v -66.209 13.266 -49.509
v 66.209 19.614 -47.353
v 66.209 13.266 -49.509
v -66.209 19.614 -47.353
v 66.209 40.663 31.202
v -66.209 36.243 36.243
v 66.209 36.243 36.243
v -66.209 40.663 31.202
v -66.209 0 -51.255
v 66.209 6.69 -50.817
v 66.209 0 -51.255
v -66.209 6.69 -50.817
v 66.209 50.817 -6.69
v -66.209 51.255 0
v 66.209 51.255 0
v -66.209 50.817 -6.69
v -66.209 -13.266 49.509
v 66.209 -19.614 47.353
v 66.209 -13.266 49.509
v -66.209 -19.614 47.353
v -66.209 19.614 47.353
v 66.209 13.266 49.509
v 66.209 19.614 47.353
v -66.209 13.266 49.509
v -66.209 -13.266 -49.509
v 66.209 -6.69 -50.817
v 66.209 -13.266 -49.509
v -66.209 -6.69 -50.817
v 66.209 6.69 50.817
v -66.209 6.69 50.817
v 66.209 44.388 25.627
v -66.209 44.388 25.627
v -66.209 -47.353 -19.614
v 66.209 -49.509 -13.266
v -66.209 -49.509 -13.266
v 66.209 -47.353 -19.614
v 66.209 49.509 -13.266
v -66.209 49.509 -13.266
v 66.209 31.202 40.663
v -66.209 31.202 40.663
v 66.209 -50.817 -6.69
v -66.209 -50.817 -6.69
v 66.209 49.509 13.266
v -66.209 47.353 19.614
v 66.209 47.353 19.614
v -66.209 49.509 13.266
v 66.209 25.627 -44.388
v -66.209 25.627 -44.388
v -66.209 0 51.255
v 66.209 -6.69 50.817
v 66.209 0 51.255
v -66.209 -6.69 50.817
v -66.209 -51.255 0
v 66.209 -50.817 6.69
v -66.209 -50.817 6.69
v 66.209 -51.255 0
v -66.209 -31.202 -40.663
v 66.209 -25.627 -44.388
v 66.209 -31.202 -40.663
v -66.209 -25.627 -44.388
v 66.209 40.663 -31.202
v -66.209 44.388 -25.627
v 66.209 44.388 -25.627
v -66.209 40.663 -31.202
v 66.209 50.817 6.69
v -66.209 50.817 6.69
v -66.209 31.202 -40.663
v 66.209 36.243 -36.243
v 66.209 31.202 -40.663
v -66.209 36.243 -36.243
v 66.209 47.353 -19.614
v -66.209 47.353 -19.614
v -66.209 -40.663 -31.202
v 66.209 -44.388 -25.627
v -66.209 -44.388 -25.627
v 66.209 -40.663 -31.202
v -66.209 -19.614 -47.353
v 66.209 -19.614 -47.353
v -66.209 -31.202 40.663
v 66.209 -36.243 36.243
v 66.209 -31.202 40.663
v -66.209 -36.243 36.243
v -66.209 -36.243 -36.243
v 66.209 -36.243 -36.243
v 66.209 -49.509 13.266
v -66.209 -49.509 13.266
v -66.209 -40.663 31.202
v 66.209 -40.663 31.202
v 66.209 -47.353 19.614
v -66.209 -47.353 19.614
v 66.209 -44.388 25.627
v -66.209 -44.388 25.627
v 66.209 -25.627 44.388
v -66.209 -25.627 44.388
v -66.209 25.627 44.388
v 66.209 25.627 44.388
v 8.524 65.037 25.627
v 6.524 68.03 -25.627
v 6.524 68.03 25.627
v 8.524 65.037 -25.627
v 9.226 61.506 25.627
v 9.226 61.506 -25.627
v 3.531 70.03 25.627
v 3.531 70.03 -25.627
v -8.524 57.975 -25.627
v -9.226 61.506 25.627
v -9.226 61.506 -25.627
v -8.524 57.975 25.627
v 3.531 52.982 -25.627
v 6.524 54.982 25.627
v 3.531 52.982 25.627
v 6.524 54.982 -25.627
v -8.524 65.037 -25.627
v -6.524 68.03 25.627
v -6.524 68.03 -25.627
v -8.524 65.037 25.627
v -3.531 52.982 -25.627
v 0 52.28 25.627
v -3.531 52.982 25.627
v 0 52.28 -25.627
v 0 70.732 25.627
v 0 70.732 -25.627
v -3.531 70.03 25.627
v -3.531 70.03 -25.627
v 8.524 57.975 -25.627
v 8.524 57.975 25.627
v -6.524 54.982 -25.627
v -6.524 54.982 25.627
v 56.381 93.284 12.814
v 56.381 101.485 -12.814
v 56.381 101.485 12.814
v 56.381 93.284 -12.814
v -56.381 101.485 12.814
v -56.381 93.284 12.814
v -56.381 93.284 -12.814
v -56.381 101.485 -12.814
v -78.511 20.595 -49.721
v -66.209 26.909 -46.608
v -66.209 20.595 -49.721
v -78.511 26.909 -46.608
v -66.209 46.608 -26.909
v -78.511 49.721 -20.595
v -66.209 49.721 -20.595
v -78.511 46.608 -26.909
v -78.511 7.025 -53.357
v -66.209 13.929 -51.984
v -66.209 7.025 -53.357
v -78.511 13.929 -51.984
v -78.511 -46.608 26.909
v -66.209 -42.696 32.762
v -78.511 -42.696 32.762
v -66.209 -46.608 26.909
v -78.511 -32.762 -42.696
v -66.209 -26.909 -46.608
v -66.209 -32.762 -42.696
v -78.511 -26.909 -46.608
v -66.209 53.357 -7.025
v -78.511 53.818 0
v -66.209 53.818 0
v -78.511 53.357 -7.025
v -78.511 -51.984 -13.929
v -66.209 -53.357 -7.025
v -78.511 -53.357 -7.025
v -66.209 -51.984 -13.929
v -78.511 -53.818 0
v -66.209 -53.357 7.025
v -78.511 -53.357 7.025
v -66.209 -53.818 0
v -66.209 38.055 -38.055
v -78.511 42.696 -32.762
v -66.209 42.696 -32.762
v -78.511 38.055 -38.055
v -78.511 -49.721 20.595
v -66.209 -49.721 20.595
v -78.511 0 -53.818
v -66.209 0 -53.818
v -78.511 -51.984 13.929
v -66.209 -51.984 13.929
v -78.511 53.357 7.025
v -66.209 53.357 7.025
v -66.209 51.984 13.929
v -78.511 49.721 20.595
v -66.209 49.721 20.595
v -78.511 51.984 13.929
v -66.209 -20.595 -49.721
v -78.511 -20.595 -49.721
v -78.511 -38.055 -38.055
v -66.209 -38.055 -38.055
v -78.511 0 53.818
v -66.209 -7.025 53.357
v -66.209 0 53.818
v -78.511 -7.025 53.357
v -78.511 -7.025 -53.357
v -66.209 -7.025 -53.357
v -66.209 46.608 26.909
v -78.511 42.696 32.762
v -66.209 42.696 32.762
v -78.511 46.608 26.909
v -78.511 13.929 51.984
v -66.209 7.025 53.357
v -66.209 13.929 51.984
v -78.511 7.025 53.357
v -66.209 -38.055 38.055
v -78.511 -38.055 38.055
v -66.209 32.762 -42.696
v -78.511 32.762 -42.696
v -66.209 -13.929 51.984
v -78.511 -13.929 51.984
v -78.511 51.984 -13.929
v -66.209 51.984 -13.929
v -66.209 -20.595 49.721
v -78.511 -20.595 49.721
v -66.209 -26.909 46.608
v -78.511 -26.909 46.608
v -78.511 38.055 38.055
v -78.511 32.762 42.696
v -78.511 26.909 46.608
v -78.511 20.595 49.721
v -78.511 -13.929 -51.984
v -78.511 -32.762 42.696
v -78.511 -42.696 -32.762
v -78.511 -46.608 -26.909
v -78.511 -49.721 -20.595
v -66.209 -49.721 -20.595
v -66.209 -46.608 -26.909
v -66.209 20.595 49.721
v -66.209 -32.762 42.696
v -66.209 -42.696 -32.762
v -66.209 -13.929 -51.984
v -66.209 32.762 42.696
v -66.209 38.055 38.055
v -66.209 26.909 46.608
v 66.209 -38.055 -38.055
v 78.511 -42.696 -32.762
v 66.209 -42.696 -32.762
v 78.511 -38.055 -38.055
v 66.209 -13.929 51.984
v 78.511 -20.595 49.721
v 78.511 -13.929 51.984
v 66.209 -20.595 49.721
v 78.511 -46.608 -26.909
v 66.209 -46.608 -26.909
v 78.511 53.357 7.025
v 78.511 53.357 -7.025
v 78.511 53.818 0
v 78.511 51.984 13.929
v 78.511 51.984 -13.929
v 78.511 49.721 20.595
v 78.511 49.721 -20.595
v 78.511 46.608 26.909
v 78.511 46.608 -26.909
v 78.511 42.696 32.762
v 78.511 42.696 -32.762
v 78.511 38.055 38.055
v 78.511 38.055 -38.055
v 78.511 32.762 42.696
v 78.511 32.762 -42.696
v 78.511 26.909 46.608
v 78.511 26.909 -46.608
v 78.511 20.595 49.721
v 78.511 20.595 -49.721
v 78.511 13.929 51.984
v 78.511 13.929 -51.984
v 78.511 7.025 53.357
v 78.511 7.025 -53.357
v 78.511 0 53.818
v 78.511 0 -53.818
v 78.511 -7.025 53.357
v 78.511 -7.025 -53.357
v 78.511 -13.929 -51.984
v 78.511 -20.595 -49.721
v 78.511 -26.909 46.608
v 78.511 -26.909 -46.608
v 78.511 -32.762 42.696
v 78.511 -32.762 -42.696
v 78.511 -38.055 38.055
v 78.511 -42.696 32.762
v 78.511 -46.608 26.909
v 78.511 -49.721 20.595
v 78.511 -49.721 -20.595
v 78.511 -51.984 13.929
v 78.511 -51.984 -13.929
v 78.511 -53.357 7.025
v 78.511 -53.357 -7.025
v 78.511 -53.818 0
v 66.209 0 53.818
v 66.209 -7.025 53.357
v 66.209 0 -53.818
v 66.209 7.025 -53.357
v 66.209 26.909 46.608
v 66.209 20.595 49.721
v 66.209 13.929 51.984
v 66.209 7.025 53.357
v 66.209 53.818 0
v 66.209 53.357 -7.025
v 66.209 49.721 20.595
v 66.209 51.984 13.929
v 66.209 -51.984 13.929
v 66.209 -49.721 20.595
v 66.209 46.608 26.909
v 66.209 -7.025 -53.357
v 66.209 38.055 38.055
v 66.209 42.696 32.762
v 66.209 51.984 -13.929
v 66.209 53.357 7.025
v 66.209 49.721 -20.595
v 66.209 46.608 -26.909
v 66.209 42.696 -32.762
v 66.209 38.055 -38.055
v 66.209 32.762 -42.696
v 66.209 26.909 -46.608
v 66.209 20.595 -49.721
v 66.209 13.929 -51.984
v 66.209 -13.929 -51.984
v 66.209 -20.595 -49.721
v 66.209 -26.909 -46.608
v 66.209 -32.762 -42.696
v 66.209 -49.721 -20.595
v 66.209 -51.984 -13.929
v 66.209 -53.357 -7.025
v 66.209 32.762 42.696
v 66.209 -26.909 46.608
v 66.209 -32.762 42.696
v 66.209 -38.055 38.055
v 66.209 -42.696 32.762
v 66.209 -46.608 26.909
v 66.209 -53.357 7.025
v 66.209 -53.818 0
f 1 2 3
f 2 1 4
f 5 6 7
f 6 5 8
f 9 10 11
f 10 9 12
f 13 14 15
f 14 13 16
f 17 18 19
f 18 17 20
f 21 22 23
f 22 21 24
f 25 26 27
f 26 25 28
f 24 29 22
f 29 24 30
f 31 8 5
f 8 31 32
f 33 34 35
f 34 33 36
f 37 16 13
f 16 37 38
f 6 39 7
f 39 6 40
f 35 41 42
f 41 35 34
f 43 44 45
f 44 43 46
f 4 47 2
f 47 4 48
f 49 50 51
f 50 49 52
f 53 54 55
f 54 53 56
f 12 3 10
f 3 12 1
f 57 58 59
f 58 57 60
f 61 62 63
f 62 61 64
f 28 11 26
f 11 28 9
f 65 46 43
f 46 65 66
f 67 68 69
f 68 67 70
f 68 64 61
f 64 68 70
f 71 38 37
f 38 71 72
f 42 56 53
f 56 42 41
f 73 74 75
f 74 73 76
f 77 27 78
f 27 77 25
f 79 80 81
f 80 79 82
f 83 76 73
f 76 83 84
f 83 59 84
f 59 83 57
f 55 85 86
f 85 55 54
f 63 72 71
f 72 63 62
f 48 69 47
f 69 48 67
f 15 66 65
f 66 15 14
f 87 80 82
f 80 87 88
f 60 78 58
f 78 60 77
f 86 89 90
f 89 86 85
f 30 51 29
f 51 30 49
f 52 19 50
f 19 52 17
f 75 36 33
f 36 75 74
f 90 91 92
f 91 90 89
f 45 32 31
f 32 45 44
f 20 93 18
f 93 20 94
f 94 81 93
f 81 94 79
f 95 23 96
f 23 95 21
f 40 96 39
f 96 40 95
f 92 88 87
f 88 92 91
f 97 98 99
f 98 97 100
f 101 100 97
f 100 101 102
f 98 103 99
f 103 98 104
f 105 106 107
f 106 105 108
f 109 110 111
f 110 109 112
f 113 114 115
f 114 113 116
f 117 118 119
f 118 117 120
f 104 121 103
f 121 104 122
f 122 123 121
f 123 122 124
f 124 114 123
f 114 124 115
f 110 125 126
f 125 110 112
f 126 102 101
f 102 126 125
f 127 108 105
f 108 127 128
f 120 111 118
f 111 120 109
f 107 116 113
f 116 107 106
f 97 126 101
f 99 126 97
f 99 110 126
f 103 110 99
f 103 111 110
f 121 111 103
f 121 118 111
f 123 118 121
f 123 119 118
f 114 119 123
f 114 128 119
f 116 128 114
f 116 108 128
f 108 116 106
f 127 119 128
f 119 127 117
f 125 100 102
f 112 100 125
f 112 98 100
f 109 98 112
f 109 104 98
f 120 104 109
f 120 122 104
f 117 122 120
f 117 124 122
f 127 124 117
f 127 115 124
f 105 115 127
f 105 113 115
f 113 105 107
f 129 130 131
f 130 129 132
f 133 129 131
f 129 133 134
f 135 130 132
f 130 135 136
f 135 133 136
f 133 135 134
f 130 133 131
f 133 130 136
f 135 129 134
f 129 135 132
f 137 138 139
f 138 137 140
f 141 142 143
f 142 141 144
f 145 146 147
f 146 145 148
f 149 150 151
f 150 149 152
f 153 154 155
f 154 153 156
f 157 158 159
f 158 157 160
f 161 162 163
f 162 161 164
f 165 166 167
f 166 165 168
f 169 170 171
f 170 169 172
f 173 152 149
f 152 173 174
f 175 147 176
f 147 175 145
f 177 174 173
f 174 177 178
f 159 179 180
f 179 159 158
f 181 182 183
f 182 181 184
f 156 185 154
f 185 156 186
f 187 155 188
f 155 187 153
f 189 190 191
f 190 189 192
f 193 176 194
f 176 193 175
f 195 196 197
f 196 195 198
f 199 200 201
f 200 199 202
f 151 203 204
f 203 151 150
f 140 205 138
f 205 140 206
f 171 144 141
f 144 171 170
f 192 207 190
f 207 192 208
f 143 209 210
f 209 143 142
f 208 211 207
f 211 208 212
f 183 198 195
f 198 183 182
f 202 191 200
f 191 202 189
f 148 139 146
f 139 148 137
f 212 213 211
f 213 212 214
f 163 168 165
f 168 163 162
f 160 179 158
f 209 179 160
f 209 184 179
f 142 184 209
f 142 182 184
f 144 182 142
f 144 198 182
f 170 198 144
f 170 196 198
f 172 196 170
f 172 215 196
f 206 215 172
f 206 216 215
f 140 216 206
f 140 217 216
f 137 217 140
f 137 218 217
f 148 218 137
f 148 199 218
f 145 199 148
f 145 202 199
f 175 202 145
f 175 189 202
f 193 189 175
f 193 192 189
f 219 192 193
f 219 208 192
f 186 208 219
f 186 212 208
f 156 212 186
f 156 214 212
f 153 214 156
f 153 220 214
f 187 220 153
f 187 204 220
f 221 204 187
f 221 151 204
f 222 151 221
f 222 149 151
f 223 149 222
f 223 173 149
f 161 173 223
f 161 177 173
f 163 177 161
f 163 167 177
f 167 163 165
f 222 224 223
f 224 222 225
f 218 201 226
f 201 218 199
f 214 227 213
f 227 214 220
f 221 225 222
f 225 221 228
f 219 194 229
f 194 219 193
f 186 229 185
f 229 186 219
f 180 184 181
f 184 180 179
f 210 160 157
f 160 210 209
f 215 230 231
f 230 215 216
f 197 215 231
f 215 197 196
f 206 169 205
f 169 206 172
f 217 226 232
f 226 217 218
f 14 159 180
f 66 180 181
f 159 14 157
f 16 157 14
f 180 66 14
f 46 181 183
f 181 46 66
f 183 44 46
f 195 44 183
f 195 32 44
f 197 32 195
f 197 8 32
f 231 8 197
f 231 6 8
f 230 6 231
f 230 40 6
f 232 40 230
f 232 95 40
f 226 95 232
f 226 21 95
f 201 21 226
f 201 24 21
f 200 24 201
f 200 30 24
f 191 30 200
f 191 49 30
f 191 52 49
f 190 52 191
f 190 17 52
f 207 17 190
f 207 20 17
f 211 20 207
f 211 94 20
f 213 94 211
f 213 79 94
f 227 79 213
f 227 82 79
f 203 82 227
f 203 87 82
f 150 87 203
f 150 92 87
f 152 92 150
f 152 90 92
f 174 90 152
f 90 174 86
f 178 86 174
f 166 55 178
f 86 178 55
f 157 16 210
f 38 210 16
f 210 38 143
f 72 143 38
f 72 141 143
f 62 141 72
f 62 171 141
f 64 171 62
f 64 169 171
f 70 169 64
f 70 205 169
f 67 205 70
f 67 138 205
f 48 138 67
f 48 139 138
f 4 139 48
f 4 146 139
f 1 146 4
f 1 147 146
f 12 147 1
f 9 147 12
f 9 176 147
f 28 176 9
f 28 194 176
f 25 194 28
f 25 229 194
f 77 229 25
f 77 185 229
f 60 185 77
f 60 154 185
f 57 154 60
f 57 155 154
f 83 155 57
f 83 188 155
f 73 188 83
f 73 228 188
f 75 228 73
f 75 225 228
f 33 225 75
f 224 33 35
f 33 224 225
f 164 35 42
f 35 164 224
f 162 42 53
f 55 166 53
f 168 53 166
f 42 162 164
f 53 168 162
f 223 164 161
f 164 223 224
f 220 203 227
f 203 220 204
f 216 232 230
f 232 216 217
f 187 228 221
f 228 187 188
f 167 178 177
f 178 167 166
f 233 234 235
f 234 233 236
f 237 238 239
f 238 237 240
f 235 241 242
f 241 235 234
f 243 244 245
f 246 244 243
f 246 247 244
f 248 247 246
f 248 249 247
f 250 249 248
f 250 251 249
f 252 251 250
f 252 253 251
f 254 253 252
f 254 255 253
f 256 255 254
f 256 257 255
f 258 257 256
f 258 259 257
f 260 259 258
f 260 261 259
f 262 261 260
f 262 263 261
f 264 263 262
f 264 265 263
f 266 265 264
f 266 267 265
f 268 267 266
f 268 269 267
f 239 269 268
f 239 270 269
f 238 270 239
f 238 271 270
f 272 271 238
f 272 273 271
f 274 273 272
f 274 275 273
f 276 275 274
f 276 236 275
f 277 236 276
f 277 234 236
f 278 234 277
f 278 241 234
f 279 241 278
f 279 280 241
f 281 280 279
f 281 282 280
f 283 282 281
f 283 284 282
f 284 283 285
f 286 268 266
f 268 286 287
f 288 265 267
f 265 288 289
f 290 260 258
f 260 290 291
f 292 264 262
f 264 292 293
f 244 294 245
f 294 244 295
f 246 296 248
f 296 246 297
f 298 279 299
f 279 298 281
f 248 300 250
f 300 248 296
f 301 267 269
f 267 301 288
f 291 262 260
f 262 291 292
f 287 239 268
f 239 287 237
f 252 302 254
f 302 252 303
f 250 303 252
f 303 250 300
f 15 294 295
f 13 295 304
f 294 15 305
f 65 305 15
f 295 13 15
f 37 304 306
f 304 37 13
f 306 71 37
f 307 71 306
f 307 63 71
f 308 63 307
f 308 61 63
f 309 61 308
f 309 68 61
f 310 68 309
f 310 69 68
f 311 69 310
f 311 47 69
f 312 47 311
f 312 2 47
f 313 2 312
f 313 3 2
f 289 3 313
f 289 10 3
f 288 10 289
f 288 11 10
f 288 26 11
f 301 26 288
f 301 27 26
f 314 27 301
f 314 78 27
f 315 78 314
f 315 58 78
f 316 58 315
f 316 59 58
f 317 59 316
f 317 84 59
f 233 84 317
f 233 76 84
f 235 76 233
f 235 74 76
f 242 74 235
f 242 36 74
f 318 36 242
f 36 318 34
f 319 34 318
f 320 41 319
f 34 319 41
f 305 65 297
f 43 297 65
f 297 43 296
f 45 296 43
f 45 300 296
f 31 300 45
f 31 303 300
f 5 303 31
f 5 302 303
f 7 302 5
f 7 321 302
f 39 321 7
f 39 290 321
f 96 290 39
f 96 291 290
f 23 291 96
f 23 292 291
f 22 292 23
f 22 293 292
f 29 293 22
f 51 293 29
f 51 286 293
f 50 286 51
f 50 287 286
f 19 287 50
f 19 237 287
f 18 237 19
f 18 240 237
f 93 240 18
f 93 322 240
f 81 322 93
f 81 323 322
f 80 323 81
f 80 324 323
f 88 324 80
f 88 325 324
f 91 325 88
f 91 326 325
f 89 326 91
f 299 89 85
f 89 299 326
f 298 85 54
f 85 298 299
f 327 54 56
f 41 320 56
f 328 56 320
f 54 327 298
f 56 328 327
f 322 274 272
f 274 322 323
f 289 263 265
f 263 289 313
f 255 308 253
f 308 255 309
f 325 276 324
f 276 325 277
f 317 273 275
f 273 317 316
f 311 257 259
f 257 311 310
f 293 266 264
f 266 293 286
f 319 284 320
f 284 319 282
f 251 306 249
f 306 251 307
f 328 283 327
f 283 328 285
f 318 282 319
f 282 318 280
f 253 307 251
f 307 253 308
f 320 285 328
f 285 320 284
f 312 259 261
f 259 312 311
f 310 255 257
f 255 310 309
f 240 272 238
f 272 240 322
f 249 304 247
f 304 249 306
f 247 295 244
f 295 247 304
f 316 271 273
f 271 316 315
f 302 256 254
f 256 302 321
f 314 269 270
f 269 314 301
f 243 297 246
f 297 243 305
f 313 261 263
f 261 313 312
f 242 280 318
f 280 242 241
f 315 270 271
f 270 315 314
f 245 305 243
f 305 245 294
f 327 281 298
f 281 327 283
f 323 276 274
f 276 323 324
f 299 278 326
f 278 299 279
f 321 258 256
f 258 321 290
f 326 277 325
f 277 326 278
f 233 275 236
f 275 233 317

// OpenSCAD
// Auto-generated by scripts/author_from_manifest.py (Phase D.3).
// Source: data/phase_d_manifest.json (sku_intent='nibco-f619-osy-gate-2in').
// Do not hand-edit — regenerate from the manifest.
//
// @part nibco_f619_osy_gate_2in
// @kind valve
// @category valve.gate
// @display-name "Nibco F-619 OS&Y Gate Valve 2\" Flanged"
// @mfg nibco
// @mfg-pn F-619
// @listing UL FM
// @price-usd 330.00
// @install-minutes 35
// @crew foreman
// @param size_in number default=2 label="Size" unit="in"
// @port inlet position=[-0.05,0,0] direction=[-1,0,0] style=grooved size_in=2 role=run_a
// @port outlet position=[0.05,0,0] direction=[1,0,0] style=grooved size_in=2 role=run_b

size_in = 2.0;

function od_mm(nps) =
    nps ==   1  ? 33.4 :
    nps == 1.25 ? 42.2 :
    nps == 1.5  ? 48.3 :
    nps ==   2  ? 60.3 :
    nps == 2.5  ? 73.0 :
    nps ==   3  ? 88.9 :
    nps ==   4  ? 114.3 :
    nps ==   6  ? 168.3 :
    nps ==   8  ? 219.1 : 73.0;

od = od_mm(size_in);
body_len = od * 2.4;
body_d   = od * 1.7;

union() {
    // Valve body
    rotate([0, 90, 0])
        cylinder(h = body_len, d = body_d, center = true, $fn = 48);
    // Stem / handle indicator
    translate([0, body_d * 0.6, 0])
        cylinder(h = body_d * 0.5, d = body_d * 0.18, center = true, $fn = 16);
    translate([0, body_d * 0.95, 0])
        cube([body_d * 1.1, body_d * 0.08, body_d * 0.25], center = true);
    // End flanges
    translate([-body_len/2, 0, 0])
        rotate([0, 90, 0])
        cylinder(h = body_d * 0.12, d = body_d * 1.05, center = true, $fn = 48);
    translate([ body_len/2, 0, 0])
        rotate([0, 90, 0])
        cylinder(h = body_d * 0.12, d = body_d * 1.05, center = true, $fn = 48);
}
